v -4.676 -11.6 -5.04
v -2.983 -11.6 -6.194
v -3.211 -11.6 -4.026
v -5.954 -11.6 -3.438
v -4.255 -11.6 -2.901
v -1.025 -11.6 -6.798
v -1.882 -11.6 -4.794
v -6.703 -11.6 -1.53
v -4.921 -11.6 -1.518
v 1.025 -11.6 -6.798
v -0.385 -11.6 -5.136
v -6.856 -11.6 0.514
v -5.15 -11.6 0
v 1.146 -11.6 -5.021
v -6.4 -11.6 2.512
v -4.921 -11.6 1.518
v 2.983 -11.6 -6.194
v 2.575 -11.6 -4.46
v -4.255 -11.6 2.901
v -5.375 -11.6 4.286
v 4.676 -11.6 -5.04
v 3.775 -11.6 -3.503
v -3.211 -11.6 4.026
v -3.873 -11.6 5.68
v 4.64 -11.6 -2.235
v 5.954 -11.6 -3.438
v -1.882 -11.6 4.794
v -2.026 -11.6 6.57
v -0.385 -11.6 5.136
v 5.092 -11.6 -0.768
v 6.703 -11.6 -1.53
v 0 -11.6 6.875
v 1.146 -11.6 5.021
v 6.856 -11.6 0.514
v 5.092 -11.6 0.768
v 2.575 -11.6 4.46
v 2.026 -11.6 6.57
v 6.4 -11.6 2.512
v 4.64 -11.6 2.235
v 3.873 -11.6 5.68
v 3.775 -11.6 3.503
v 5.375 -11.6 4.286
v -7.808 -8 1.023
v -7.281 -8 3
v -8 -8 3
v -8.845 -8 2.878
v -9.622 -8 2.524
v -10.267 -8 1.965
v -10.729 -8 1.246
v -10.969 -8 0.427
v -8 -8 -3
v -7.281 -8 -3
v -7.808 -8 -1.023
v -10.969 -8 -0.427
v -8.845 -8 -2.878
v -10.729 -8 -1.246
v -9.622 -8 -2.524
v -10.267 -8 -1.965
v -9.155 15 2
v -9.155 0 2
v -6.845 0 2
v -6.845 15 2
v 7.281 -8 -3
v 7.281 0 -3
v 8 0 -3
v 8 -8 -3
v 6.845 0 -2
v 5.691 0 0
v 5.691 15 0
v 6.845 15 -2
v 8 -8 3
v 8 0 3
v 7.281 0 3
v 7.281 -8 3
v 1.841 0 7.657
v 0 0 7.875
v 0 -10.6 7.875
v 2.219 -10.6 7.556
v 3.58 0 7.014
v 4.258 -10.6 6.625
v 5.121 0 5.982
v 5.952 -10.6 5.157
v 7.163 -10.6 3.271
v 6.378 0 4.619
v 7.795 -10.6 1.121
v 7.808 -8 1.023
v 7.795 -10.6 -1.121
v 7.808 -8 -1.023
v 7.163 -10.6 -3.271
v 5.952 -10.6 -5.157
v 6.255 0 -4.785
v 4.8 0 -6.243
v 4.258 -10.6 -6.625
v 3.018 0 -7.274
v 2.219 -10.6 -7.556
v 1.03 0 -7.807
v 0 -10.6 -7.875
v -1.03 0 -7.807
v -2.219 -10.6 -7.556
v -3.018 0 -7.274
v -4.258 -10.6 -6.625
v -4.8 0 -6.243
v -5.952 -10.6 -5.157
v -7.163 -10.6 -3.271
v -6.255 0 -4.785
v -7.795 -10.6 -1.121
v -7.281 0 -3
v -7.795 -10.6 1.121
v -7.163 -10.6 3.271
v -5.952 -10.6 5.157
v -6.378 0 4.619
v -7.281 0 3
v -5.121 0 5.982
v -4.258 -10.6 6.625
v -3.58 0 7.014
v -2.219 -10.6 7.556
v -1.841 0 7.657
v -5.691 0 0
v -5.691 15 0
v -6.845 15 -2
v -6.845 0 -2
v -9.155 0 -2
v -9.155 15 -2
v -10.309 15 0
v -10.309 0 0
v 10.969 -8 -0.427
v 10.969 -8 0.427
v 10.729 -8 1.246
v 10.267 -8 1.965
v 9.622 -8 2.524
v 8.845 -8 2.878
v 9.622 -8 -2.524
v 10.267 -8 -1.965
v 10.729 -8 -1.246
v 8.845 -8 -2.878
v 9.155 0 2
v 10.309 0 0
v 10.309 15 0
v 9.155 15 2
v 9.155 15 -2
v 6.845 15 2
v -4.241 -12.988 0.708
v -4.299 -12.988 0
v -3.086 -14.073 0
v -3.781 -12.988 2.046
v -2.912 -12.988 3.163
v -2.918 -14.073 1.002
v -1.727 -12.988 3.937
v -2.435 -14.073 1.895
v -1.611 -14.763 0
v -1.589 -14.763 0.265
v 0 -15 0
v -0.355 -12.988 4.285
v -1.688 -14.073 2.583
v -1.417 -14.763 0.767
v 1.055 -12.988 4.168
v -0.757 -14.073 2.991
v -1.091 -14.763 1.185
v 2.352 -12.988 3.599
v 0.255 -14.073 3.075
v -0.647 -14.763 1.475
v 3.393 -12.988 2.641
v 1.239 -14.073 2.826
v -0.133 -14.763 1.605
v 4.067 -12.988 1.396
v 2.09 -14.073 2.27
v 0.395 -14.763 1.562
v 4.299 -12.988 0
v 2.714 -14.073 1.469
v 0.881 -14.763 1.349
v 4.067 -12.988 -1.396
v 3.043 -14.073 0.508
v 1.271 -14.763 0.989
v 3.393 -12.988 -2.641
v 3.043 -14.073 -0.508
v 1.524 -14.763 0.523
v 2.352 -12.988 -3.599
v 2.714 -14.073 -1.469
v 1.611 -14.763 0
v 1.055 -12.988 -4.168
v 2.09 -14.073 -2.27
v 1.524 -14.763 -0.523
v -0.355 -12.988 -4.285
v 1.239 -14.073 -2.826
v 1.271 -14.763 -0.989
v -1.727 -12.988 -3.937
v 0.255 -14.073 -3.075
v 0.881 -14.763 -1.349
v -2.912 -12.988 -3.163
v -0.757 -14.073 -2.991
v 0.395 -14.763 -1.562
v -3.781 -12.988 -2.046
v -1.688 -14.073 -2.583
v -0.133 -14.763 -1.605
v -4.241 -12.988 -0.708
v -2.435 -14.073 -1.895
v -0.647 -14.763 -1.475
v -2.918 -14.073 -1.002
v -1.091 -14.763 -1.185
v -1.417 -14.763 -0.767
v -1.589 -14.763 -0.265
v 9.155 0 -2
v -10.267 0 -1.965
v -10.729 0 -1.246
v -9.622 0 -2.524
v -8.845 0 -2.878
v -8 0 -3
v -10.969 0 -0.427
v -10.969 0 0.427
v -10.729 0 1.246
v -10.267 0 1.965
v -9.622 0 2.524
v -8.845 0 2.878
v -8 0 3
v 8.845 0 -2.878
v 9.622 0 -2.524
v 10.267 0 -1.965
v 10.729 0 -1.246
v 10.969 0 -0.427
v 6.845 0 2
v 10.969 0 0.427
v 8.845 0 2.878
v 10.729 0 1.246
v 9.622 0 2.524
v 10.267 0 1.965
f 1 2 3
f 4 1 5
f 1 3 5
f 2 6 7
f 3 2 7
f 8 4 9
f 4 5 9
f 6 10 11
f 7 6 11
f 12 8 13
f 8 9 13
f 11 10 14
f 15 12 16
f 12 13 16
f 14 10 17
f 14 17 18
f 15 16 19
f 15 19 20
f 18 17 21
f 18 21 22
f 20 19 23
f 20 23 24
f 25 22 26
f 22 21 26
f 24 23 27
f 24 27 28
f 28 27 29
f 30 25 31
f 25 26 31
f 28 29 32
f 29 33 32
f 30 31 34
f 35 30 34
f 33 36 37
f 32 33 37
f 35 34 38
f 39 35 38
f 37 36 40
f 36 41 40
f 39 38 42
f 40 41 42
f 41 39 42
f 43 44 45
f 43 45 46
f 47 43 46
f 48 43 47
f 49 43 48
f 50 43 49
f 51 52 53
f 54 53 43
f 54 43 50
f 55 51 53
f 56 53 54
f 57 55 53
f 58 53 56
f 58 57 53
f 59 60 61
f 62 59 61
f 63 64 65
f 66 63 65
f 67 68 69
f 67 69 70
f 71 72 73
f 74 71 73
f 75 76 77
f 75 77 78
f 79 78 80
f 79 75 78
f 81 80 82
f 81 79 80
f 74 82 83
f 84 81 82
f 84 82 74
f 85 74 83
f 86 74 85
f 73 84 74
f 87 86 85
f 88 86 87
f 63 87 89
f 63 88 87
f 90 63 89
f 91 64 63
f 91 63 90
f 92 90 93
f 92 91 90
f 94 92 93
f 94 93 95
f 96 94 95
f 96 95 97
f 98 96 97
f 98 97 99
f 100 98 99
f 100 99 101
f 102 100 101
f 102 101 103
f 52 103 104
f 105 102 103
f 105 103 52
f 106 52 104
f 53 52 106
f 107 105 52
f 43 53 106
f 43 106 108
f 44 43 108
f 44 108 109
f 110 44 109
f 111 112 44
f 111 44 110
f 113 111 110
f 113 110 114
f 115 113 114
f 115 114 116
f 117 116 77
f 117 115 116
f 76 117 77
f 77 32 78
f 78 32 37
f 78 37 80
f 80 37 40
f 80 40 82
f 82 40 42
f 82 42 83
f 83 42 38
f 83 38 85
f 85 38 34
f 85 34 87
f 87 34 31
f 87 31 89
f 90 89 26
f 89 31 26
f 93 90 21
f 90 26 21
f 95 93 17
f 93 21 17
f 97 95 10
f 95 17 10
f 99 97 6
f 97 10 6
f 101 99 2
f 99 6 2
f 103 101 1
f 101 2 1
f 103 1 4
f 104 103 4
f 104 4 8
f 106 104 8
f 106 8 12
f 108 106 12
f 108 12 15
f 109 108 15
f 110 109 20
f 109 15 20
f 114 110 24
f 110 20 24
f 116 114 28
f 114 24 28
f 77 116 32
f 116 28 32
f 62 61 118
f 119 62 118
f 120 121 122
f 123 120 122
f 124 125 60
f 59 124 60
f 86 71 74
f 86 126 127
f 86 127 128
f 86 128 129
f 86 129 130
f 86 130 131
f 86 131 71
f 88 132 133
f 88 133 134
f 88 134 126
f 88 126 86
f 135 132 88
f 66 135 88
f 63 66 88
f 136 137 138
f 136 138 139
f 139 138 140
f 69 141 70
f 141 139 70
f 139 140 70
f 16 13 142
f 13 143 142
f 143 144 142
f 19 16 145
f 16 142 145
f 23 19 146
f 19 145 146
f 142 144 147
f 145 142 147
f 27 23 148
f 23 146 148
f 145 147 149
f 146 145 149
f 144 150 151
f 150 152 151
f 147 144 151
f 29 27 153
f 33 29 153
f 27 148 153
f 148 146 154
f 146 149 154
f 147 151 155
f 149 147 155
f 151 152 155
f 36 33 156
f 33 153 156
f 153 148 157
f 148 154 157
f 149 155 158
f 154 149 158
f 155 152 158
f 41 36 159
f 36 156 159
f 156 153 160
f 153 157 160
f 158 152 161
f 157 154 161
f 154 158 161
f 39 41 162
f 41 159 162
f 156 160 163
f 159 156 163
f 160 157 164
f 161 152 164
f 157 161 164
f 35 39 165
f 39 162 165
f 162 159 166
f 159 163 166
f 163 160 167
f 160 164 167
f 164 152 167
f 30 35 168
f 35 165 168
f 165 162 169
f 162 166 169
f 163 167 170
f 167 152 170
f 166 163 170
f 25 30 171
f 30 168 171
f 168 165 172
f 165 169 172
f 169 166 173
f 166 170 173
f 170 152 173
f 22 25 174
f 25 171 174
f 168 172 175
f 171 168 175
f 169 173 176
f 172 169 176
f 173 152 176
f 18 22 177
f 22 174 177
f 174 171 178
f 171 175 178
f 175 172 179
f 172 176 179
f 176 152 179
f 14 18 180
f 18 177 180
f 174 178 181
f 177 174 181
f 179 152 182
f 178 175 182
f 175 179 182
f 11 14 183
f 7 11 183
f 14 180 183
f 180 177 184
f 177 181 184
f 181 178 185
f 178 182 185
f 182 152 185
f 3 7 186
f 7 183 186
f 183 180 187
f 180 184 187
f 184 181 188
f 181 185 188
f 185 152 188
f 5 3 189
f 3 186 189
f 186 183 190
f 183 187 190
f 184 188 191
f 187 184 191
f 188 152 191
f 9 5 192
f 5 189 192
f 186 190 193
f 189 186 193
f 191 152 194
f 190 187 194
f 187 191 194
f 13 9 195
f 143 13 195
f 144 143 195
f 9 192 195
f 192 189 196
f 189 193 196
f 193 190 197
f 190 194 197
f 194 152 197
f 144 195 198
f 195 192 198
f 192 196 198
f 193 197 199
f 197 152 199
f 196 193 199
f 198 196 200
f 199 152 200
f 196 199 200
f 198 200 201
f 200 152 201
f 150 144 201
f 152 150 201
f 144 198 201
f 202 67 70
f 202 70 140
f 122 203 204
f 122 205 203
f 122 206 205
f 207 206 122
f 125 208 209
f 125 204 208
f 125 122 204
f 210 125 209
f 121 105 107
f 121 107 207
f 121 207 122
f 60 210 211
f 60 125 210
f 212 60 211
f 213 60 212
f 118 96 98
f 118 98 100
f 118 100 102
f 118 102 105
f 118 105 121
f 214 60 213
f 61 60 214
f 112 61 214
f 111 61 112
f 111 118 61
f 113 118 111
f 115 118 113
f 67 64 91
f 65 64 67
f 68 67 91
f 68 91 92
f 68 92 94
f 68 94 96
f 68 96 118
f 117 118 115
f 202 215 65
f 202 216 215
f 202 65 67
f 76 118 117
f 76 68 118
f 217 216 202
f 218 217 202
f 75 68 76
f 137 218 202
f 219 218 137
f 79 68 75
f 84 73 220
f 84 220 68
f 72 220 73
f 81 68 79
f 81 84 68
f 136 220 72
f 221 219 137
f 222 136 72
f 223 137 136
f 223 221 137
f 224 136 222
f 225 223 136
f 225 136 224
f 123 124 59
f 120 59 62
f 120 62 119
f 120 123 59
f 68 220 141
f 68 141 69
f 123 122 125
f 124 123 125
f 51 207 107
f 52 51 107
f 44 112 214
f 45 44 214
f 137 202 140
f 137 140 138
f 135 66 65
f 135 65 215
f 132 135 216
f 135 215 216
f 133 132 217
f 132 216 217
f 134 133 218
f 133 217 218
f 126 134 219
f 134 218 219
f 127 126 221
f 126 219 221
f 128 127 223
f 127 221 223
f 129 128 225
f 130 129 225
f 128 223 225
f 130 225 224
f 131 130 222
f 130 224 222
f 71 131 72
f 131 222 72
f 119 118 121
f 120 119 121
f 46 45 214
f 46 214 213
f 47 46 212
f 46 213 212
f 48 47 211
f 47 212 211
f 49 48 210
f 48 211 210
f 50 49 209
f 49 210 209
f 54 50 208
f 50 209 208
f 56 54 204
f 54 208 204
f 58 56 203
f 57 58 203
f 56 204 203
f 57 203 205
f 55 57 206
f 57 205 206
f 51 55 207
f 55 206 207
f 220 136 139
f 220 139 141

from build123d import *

# Parameters (mm, degrees)
SKETCH1_R           = 7.875
BOSS_EXTRUDE1_DEPTH = 11.6
BOSS_EXTRUDE2_DEPTH = 8
BOSS_EXTRUDE3_DEPTH = 15
CHAMFER1_SIZE       = 1


with BuildPart() as part:
    # Sketch1 → Boss-Extrude1 (new body)
    with BuildSketch(Plane(origin=(0, 0, 0), x_dir=(1, 0, 0), z_dir=(0, 1, 0))):
        with Locations(Location((0, 0, 0), (0, 0, 270))):
            Circle(SKETCH1_R)
    extrude(amount=-BOSS_EXTRUDE1_DEPTH)

    # Sketch2 → Boss-Extrude2 (add)
    with BuildSketch(Plane(origin=(0, 0, 0), x_dir=(1, 0, 0), z_dir=(0, 1, 0))):
        with BuildLine():
            Line((-8, 3), (-7.28118294, 3))
            ThreePointArc((-7.28118294, 3), (-7.875, 0), (-7.28118294, -3))
            Line((-7.28118294, -3), (-8, -3))
            ThreePointArc((-8, -3), (-11, 0), (-8, 3))
        make_face()
        with BuildLine():
            Line((8, -3), (7.28118294, -3))
            ThreePointArc((7.28118294, -3), (7.875, 0), (7.28118294, 3))
            Line((7.28118294, 3), (8, 3))
            ThreePointArc((8, 3), (11, 0), (8, -3))
        make_face()
    extrude(amount=-BOSS_EXTRUDE2_DEPTH)

    # Sketch3 → Boss-Extrude3 (add)
    with BuildSketch(Plane(origin=(0, 0, 0), x_dir=(1, 0, 0), z_dir=(0, 1, 0))):
        Polygon((6.845299462, -2), (5.690598923, 0), (6.845299462, 2), (9.154700538, 2), (10.309401077, 0), (9.154700538, -2), align=None)
        Polygon((-5.690598923, 0), (-6.845299462, 2), (-9.154700538, 2), (-10.309401077, 0), (-9.154700538, -2), (-6.845299462, -2), align=None)
    extrude(amount=BOSS_EXTRUDE3_DEPTH)

    # Sketch4 → Revolve1 (revolve)
    with BuildSketch(Plane.XY, mode=Mode.PRIVATE) as revolve1_sk:
        with BuildLine():
            Line((0, -11.6), (5.15, -11.6))
            ThreePointArc((5.15, -11.6), (3.085551004, -14.073334609), (0, -15))
            Line((0, -15), (0, -11.6))
        make_face()
    revolve(revolve1_sk.sketch.rotate(Axis((0, -15, 0), (0, 1, 0)), 180), axis=Axis((0, -15, 0), (0, 1, 0)))

    # Chamfer1
    chamfer1_edges = [part.edges().sort_by_distance(p)[0] for p in [
        (0, -11.6, -7.875),
    ]]
    chamfer(chamfer1_edges, length=CHAMFER1_SIZE)


solid = part.part
